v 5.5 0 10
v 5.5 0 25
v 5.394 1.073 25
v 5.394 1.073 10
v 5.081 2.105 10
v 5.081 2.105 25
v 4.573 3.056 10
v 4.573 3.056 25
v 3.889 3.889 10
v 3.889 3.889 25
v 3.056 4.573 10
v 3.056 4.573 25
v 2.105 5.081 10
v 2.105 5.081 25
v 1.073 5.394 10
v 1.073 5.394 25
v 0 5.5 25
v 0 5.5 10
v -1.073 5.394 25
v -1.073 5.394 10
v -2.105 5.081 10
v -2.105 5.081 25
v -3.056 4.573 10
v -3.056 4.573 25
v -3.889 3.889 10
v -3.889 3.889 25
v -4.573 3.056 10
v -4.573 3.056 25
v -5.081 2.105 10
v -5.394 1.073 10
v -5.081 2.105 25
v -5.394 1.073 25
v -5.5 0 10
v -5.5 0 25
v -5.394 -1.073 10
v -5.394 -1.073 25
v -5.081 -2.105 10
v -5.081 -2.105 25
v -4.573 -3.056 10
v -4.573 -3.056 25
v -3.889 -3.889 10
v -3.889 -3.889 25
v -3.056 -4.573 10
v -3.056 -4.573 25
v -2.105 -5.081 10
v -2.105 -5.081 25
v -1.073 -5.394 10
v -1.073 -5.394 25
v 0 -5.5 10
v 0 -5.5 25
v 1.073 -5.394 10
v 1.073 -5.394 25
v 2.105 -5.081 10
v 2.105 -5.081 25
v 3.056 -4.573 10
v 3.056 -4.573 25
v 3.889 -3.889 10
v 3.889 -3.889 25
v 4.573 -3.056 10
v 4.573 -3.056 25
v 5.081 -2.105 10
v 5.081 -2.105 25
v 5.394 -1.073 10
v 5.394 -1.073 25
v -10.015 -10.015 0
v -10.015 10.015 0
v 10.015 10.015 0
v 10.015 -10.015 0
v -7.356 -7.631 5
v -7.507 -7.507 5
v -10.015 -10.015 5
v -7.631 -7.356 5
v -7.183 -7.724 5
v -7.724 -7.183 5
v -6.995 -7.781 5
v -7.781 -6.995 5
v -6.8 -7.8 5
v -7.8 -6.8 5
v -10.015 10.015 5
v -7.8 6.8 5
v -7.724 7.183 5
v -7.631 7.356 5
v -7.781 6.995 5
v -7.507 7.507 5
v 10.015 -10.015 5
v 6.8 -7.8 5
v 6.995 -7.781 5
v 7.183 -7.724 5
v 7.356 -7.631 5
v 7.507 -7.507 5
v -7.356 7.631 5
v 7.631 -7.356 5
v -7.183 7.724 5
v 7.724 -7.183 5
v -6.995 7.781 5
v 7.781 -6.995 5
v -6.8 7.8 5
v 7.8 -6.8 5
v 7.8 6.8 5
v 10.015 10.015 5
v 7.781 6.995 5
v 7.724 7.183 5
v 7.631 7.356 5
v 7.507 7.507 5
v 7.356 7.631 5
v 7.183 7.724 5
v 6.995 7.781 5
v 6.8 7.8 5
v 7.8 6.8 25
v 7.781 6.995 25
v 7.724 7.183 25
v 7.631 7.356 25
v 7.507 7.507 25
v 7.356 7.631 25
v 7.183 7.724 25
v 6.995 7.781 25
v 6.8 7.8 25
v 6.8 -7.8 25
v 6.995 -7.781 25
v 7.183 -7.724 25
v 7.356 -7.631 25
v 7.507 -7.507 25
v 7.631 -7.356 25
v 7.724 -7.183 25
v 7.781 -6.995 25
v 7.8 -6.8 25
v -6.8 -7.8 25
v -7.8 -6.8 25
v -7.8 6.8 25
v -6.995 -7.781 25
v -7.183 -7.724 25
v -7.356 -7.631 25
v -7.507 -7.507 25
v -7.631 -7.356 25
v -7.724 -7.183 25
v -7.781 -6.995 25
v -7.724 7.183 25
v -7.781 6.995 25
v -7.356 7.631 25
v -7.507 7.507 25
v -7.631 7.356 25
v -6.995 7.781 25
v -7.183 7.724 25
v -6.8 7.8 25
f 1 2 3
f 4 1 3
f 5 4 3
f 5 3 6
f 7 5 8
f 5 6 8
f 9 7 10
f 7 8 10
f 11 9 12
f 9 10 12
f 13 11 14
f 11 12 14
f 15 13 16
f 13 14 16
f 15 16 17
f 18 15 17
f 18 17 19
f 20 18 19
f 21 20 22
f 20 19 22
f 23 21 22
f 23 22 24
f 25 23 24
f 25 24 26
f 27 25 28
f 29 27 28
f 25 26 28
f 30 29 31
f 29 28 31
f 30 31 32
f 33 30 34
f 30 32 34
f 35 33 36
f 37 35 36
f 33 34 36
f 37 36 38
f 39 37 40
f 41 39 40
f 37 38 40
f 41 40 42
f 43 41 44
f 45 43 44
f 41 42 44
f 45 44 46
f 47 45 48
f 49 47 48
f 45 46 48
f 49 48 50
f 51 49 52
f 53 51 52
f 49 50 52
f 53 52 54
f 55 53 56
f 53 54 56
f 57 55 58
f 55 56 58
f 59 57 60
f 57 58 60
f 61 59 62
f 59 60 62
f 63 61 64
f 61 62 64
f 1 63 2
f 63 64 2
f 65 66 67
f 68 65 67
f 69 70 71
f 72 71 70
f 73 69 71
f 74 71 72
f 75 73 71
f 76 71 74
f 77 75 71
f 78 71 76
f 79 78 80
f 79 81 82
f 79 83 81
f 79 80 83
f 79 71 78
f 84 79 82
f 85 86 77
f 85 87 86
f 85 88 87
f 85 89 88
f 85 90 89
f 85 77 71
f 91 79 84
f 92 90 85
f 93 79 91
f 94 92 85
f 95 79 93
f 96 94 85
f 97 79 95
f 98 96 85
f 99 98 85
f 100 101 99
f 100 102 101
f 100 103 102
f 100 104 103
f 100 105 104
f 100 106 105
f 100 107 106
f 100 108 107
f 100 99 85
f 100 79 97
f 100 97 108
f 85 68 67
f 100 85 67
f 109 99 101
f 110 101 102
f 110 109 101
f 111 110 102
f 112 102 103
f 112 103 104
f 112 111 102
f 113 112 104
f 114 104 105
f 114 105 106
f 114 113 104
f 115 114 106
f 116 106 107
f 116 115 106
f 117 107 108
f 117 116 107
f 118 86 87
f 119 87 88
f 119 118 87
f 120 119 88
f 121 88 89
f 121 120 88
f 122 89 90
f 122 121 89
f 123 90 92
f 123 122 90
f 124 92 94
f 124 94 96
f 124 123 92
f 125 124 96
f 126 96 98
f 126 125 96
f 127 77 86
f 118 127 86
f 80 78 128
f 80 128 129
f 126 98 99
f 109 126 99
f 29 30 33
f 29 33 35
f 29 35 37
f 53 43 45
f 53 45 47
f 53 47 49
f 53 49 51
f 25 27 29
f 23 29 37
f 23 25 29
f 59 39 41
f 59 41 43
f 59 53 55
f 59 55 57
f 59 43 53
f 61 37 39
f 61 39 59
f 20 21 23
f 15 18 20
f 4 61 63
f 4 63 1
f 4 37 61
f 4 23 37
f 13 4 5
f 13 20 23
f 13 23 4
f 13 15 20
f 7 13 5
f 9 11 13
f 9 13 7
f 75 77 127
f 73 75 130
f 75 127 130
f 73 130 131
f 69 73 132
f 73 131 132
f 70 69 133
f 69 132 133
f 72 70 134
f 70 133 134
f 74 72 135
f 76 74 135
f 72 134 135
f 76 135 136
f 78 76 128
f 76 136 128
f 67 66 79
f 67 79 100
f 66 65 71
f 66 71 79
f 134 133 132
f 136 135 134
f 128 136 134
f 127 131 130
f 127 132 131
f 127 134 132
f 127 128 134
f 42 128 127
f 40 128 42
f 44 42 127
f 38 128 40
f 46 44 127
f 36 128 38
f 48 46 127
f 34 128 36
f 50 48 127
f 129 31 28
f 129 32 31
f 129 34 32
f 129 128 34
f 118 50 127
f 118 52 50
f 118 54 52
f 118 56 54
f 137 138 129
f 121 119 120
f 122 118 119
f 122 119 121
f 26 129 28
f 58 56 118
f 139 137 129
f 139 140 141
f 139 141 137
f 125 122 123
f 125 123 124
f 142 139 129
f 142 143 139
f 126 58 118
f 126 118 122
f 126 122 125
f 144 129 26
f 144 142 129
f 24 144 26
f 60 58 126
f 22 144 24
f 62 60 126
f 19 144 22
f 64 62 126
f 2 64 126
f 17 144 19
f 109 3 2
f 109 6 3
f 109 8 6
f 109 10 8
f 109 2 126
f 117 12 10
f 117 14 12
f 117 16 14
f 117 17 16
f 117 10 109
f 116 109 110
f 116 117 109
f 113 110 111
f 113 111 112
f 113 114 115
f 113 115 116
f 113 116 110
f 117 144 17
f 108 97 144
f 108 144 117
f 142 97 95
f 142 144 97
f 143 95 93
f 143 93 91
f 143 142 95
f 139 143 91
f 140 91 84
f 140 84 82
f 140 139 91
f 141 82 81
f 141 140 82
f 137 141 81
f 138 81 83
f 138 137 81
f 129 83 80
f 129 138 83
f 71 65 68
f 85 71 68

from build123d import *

# Parameters (mm, degrees)
F0_W     = 20.03
F0_H     = 20.03
F1_DEPTH = 5
F2_W     = 15.6
F2_H     = 15.6
F3_DEPTH = 20
F4_R     = 5.5
F5_DEPTH = 15
F6_R     = 1


with BuildPart() as f1:
    # F0 (on Top) → F1 (new body)
    with BuildSketch(Plane.XY):
        Rectangle(F0_W, F0_H)
    extrude(amount=F1_DEPTH)

    # F2 (on face) → F3 (join)
    with BuildSketch(Plane.XY.offset(5)):
        Rectangle(F2_W, F2_H)
    extrude(amount=F3_DEPTH)

    # F4 (on face) → F5 (cut)
    with BuildSketch(Plane.XY.offset(25)):
        Circle(F4_R)
    extrude(amount=-F5_DEPTH, mode=Mode.SUBTRACT)

    # F6
    f6_edges = [f1.edges().sort_by_distance(p)[0] for p in [
        (-7.8, -7.8, 15),
        (7.8, -7.8, 15),
        (7.8, 7.8, 15),
        (-7.8, 7.8, 15),
    ]]
    fillet(f6_edges, radius=F6_R)


solid = f1.part
